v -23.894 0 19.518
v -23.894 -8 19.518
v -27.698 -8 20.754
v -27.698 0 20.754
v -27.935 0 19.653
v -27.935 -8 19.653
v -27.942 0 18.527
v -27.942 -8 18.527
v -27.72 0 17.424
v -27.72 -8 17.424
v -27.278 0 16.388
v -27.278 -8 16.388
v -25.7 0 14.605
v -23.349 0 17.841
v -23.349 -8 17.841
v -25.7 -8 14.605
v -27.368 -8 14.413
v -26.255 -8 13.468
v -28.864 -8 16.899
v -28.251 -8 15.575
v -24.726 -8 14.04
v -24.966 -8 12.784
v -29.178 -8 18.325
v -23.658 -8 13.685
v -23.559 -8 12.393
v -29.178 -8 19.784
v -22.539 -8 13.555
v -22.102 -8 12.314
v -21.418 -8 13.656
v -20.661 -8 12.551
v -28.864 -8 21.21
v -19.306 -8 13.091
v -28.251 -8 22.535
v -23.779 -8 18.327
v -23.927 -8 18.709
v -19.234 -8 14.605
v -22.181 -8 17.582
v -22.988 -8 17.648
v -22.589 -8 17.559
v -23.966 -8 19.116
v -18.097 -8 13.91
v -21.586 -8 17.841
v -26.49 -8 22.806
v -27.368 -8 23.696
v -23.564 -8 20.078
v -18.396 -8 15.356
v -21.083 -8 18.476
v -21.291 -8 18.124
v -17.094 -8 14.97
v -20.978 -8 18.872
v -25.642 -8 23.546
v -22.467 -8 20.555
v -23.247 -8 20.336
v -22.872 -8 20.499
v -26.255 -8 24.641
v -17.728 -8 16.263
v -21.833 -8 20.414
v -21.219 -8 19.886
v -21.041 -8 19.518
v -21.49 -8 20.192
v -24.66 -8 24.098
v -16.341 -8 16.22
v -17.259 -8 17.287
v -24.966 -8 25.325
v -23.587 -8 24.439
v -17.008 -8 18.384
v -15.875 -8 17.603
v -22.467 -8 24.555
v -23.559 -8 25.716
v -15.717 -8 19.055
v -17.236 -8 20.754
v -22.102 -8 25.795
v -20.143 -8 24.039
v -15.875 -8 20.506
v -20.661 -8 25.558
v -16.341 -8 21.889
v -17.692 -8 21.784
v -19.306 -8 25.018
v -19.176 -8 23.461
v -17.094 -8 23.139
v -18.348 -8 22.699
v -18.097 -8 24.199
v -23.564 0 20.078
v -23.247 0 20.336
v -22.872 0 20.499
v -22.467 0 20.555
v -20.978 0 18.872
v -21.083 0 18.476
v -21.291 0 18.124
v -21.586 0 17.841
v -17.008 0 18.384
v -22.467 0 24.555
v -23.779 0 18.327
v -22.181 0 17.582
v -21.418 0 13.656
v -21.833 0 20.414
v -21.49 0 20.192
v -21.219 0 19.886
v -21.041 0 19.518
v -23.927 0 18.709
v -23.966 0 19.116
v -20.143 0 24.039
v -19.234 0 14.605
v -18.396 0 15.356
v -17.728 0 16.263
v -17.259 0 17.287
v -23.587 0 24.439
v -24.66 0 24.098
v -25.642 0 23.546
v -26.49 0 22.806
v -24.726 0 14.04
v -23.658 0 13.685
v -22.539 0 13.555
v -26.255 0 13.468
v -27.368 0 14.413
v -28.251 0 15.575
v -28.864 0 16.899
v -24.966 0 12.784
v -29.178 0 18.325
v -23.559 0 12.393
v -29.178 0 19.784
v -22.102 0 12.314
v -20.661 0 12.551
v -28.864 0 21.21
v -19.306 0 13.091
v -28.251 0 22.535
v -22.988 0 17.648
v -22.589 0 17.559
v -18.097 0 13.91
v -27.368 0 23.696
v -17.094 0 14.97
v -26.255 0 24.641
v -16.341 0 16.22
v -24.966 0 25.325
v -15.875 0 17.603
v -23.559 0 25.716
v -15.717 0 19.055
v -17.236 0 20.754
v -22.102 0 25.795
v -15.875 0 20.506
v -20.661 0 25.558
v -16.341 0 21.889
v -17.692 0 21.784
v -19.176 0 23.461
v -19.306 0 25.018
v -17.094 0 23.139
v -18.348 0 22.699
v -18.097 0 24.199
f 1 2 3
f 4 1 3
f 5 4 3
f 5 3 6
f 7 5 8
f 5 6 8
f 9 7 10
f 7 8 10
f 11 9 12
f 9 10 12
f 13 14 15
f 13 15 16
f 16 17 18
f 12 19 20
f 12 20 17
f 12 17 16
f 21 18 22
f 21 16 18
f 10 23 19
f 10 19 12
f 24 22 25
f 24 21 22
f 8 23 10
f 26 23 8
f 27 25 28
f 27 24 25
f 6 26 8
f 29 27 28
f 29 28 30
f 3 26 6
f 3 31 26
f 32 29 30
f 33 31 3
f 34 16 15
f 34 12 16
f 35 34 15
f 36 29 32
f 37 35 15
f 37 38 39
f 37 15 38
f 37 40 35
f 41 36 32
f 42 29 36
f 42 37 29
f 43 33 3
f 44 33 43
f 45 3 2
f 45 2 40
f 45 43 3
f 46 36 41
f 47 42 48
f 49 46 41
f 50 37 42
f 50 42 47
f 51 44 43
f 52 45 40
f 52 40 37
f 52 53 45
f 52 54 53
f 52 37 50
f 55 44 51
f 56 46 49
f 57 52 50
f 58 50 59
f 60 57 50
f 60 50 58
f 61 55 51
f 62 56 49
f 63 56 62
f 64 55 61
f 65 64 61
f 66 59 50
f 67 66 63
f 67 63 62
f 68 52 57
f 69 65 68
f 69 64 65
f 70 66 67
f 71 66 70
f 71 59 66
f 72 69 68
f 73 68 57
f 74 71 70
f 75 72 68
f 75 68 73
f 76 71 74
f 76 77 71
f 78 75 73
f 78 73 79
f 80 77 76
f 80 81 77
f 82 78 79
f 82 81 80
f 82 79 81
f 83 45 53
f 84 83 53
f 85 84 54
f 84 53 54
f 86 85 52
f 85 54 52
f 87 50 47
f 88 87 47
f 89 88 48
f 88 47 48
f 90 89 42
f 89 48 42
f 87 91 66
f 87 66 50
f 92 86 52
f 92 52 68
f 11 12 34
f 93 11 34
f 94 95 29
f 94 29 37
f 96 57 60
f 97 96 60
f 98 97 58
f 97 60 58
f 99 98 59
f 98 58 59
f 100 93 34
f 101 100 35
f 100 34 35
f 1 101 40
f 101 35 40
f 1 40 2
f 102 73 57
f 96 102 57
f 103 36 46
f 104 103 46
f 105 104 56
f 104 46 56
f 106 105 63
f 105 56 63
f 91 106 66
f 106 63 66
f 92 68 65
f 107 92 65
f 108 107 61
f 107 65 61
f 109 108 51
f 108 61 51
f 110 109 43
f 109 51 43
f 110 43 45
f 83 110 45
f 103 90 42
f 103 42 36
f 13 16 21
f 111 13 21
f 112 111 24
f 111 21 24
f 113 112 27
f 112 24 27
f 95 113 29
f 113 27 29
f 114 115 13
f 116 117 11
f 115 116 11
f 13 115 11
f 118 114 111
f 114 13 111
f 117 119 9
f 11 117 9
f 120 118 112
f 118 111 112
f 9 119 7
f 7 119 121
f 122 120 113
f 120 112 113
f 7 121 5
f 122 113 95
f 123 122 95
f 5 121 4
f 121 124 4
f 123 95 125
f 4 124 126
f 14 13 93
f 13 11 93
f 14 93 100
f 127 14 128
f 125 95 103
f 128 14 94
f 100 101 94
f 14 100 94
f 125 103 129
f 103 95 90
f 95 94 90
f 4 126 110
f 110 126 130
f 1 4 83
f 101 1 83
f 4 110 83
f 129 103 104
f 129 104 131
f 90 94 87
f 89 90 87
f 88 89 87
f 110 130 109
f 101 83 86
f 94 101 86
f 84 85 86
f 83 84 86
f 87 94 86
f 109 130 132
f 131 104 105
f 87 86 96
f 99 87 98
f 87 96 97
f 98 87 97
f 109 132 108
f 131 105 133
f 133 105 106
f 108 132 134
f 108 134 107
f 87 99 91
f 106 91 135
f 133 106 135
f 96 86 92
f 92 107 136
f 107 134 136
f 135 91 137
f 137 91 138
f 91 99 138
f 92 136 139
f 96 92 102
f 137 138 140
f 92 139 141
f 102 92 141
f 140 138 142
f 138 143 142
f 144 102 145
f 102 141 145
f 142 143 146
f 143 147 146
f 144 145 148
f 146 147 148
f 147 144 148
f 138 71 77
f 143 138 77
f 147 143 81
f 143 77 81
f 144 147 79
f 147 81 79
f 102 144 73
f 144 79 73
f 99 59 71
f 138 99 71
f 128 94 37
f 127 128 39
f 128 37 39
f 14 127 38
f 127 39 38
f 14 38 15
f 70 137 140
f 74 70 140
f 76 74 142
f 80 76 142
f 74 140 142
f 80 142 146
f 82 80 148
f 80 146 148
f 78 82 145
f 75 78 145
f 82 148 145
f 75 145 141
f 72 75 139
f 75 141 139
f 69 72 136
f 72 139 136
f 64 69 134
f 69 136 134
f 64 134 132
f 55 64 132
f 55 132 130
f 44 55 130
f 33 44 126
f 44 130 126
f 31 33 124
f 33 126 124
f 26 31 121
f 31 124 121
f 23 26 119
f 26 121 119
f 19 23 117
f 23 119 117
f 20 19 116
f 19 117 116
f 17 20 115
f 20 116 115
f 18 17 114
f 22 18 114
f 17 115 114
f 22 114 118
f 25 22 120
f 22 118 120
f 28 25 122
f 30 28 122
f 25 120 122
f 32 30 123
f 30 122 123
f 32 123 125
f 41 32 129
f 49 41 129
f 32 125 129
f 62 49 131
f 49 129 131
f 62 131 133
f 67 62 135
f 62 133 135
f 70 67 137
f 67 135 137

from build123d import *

# Parameters (mm, degrees)
F0_R     = 6.75
F1_DEPTH = 8
F3_DEPTH = 8.001


with BuildPart() as f1:
    # F0 (on Front) → F1 (new body)
    with BuildSketch(Plane.XZ):
        with Locations((-22.467263, 19.054513)):
            Circle(F0_R)
    extrude(amount=F1_DEPTH)

    # F2 (on face) → F3 (cut, through all)
    with BuildSketch(Plane.XZ.offset(8)):
        with BuildLine():
            Line((-22.467263, 20.554513), (-22.467263, 24.554513))
            ThreePointArc((-22.467263, 24.554513), (-24.660383, 24.098344), (-26.489708, 22.805504))
            Line((-26.489708, 22.805504), (-23.564294, 20.077511))
            ThreePointArc((-23.564294, 20.077511), (-23.065387, 20.430104), (-22.467263, 20.554513))
        make_face()
        with BuildLine():
            Line((-21.040678, 19.518039), (-17.236452, 20.754107))
            ThreePointArc((-17.236452, 20.754107), (-18.348007, 22.698924), (-20.142863, 24.039206))
            Line((-20.142863, 24.039206), (-21.833336, 20.413975))
            ThreePointArc((-21.833336, 20.413975), (-21.343829, 20.048443), (-21.040678, 19.518039))
        make_face()
        with BuildLine():
            ThreePointArc((-19.234444, 14.60492), (-17.728303, 16.263052), (-17.008259, 18.384232))
            Line((-17.008259, 18.384232), (-20.978444, 18.871709))
            ThreePointArc((-20.978444, 18.871709), (-21.174819, 18.293206), (-21.585585, 17.840988))
            Line((-21.585585, 17.840988), (-19.234444, 14.60492))
        make_face()
        with BuildLine():
            ThreePointArc((-25.700082, 14.60492), (-23.657681, 13.684885), (-21.417814, 13.655564))
            Line((-21.417814, 13.655564), (-22.18105, 17.582073))
            ThreePointArc((-22.18105, 17.582073), (-22.791922, 17.590069), (-23.348941, 17.840988))
            Line((-23.348941, 17.840988), (-25.700082, 14.60492))
        make_face()
        with BuildLine():
            Line((-23.893848, 19.518039), (-27.698074, 20.754107))
            ThreePointArc((-27.698074, 20.754107), (-27.941942, 18.527362), (-27.277671, 16.388061))
            Line((-27.277671, 16.388061), (-23.779193, 18.327299))
            ThreePointArc((-23.779193, 18.327299), (-23.960357, 18.910745), (-23.893848, 19.518039))
        make_face()
    extrude(amount=-F3_DEPTH, mode=Mode.SUBTRACT)


solid = f1.part
